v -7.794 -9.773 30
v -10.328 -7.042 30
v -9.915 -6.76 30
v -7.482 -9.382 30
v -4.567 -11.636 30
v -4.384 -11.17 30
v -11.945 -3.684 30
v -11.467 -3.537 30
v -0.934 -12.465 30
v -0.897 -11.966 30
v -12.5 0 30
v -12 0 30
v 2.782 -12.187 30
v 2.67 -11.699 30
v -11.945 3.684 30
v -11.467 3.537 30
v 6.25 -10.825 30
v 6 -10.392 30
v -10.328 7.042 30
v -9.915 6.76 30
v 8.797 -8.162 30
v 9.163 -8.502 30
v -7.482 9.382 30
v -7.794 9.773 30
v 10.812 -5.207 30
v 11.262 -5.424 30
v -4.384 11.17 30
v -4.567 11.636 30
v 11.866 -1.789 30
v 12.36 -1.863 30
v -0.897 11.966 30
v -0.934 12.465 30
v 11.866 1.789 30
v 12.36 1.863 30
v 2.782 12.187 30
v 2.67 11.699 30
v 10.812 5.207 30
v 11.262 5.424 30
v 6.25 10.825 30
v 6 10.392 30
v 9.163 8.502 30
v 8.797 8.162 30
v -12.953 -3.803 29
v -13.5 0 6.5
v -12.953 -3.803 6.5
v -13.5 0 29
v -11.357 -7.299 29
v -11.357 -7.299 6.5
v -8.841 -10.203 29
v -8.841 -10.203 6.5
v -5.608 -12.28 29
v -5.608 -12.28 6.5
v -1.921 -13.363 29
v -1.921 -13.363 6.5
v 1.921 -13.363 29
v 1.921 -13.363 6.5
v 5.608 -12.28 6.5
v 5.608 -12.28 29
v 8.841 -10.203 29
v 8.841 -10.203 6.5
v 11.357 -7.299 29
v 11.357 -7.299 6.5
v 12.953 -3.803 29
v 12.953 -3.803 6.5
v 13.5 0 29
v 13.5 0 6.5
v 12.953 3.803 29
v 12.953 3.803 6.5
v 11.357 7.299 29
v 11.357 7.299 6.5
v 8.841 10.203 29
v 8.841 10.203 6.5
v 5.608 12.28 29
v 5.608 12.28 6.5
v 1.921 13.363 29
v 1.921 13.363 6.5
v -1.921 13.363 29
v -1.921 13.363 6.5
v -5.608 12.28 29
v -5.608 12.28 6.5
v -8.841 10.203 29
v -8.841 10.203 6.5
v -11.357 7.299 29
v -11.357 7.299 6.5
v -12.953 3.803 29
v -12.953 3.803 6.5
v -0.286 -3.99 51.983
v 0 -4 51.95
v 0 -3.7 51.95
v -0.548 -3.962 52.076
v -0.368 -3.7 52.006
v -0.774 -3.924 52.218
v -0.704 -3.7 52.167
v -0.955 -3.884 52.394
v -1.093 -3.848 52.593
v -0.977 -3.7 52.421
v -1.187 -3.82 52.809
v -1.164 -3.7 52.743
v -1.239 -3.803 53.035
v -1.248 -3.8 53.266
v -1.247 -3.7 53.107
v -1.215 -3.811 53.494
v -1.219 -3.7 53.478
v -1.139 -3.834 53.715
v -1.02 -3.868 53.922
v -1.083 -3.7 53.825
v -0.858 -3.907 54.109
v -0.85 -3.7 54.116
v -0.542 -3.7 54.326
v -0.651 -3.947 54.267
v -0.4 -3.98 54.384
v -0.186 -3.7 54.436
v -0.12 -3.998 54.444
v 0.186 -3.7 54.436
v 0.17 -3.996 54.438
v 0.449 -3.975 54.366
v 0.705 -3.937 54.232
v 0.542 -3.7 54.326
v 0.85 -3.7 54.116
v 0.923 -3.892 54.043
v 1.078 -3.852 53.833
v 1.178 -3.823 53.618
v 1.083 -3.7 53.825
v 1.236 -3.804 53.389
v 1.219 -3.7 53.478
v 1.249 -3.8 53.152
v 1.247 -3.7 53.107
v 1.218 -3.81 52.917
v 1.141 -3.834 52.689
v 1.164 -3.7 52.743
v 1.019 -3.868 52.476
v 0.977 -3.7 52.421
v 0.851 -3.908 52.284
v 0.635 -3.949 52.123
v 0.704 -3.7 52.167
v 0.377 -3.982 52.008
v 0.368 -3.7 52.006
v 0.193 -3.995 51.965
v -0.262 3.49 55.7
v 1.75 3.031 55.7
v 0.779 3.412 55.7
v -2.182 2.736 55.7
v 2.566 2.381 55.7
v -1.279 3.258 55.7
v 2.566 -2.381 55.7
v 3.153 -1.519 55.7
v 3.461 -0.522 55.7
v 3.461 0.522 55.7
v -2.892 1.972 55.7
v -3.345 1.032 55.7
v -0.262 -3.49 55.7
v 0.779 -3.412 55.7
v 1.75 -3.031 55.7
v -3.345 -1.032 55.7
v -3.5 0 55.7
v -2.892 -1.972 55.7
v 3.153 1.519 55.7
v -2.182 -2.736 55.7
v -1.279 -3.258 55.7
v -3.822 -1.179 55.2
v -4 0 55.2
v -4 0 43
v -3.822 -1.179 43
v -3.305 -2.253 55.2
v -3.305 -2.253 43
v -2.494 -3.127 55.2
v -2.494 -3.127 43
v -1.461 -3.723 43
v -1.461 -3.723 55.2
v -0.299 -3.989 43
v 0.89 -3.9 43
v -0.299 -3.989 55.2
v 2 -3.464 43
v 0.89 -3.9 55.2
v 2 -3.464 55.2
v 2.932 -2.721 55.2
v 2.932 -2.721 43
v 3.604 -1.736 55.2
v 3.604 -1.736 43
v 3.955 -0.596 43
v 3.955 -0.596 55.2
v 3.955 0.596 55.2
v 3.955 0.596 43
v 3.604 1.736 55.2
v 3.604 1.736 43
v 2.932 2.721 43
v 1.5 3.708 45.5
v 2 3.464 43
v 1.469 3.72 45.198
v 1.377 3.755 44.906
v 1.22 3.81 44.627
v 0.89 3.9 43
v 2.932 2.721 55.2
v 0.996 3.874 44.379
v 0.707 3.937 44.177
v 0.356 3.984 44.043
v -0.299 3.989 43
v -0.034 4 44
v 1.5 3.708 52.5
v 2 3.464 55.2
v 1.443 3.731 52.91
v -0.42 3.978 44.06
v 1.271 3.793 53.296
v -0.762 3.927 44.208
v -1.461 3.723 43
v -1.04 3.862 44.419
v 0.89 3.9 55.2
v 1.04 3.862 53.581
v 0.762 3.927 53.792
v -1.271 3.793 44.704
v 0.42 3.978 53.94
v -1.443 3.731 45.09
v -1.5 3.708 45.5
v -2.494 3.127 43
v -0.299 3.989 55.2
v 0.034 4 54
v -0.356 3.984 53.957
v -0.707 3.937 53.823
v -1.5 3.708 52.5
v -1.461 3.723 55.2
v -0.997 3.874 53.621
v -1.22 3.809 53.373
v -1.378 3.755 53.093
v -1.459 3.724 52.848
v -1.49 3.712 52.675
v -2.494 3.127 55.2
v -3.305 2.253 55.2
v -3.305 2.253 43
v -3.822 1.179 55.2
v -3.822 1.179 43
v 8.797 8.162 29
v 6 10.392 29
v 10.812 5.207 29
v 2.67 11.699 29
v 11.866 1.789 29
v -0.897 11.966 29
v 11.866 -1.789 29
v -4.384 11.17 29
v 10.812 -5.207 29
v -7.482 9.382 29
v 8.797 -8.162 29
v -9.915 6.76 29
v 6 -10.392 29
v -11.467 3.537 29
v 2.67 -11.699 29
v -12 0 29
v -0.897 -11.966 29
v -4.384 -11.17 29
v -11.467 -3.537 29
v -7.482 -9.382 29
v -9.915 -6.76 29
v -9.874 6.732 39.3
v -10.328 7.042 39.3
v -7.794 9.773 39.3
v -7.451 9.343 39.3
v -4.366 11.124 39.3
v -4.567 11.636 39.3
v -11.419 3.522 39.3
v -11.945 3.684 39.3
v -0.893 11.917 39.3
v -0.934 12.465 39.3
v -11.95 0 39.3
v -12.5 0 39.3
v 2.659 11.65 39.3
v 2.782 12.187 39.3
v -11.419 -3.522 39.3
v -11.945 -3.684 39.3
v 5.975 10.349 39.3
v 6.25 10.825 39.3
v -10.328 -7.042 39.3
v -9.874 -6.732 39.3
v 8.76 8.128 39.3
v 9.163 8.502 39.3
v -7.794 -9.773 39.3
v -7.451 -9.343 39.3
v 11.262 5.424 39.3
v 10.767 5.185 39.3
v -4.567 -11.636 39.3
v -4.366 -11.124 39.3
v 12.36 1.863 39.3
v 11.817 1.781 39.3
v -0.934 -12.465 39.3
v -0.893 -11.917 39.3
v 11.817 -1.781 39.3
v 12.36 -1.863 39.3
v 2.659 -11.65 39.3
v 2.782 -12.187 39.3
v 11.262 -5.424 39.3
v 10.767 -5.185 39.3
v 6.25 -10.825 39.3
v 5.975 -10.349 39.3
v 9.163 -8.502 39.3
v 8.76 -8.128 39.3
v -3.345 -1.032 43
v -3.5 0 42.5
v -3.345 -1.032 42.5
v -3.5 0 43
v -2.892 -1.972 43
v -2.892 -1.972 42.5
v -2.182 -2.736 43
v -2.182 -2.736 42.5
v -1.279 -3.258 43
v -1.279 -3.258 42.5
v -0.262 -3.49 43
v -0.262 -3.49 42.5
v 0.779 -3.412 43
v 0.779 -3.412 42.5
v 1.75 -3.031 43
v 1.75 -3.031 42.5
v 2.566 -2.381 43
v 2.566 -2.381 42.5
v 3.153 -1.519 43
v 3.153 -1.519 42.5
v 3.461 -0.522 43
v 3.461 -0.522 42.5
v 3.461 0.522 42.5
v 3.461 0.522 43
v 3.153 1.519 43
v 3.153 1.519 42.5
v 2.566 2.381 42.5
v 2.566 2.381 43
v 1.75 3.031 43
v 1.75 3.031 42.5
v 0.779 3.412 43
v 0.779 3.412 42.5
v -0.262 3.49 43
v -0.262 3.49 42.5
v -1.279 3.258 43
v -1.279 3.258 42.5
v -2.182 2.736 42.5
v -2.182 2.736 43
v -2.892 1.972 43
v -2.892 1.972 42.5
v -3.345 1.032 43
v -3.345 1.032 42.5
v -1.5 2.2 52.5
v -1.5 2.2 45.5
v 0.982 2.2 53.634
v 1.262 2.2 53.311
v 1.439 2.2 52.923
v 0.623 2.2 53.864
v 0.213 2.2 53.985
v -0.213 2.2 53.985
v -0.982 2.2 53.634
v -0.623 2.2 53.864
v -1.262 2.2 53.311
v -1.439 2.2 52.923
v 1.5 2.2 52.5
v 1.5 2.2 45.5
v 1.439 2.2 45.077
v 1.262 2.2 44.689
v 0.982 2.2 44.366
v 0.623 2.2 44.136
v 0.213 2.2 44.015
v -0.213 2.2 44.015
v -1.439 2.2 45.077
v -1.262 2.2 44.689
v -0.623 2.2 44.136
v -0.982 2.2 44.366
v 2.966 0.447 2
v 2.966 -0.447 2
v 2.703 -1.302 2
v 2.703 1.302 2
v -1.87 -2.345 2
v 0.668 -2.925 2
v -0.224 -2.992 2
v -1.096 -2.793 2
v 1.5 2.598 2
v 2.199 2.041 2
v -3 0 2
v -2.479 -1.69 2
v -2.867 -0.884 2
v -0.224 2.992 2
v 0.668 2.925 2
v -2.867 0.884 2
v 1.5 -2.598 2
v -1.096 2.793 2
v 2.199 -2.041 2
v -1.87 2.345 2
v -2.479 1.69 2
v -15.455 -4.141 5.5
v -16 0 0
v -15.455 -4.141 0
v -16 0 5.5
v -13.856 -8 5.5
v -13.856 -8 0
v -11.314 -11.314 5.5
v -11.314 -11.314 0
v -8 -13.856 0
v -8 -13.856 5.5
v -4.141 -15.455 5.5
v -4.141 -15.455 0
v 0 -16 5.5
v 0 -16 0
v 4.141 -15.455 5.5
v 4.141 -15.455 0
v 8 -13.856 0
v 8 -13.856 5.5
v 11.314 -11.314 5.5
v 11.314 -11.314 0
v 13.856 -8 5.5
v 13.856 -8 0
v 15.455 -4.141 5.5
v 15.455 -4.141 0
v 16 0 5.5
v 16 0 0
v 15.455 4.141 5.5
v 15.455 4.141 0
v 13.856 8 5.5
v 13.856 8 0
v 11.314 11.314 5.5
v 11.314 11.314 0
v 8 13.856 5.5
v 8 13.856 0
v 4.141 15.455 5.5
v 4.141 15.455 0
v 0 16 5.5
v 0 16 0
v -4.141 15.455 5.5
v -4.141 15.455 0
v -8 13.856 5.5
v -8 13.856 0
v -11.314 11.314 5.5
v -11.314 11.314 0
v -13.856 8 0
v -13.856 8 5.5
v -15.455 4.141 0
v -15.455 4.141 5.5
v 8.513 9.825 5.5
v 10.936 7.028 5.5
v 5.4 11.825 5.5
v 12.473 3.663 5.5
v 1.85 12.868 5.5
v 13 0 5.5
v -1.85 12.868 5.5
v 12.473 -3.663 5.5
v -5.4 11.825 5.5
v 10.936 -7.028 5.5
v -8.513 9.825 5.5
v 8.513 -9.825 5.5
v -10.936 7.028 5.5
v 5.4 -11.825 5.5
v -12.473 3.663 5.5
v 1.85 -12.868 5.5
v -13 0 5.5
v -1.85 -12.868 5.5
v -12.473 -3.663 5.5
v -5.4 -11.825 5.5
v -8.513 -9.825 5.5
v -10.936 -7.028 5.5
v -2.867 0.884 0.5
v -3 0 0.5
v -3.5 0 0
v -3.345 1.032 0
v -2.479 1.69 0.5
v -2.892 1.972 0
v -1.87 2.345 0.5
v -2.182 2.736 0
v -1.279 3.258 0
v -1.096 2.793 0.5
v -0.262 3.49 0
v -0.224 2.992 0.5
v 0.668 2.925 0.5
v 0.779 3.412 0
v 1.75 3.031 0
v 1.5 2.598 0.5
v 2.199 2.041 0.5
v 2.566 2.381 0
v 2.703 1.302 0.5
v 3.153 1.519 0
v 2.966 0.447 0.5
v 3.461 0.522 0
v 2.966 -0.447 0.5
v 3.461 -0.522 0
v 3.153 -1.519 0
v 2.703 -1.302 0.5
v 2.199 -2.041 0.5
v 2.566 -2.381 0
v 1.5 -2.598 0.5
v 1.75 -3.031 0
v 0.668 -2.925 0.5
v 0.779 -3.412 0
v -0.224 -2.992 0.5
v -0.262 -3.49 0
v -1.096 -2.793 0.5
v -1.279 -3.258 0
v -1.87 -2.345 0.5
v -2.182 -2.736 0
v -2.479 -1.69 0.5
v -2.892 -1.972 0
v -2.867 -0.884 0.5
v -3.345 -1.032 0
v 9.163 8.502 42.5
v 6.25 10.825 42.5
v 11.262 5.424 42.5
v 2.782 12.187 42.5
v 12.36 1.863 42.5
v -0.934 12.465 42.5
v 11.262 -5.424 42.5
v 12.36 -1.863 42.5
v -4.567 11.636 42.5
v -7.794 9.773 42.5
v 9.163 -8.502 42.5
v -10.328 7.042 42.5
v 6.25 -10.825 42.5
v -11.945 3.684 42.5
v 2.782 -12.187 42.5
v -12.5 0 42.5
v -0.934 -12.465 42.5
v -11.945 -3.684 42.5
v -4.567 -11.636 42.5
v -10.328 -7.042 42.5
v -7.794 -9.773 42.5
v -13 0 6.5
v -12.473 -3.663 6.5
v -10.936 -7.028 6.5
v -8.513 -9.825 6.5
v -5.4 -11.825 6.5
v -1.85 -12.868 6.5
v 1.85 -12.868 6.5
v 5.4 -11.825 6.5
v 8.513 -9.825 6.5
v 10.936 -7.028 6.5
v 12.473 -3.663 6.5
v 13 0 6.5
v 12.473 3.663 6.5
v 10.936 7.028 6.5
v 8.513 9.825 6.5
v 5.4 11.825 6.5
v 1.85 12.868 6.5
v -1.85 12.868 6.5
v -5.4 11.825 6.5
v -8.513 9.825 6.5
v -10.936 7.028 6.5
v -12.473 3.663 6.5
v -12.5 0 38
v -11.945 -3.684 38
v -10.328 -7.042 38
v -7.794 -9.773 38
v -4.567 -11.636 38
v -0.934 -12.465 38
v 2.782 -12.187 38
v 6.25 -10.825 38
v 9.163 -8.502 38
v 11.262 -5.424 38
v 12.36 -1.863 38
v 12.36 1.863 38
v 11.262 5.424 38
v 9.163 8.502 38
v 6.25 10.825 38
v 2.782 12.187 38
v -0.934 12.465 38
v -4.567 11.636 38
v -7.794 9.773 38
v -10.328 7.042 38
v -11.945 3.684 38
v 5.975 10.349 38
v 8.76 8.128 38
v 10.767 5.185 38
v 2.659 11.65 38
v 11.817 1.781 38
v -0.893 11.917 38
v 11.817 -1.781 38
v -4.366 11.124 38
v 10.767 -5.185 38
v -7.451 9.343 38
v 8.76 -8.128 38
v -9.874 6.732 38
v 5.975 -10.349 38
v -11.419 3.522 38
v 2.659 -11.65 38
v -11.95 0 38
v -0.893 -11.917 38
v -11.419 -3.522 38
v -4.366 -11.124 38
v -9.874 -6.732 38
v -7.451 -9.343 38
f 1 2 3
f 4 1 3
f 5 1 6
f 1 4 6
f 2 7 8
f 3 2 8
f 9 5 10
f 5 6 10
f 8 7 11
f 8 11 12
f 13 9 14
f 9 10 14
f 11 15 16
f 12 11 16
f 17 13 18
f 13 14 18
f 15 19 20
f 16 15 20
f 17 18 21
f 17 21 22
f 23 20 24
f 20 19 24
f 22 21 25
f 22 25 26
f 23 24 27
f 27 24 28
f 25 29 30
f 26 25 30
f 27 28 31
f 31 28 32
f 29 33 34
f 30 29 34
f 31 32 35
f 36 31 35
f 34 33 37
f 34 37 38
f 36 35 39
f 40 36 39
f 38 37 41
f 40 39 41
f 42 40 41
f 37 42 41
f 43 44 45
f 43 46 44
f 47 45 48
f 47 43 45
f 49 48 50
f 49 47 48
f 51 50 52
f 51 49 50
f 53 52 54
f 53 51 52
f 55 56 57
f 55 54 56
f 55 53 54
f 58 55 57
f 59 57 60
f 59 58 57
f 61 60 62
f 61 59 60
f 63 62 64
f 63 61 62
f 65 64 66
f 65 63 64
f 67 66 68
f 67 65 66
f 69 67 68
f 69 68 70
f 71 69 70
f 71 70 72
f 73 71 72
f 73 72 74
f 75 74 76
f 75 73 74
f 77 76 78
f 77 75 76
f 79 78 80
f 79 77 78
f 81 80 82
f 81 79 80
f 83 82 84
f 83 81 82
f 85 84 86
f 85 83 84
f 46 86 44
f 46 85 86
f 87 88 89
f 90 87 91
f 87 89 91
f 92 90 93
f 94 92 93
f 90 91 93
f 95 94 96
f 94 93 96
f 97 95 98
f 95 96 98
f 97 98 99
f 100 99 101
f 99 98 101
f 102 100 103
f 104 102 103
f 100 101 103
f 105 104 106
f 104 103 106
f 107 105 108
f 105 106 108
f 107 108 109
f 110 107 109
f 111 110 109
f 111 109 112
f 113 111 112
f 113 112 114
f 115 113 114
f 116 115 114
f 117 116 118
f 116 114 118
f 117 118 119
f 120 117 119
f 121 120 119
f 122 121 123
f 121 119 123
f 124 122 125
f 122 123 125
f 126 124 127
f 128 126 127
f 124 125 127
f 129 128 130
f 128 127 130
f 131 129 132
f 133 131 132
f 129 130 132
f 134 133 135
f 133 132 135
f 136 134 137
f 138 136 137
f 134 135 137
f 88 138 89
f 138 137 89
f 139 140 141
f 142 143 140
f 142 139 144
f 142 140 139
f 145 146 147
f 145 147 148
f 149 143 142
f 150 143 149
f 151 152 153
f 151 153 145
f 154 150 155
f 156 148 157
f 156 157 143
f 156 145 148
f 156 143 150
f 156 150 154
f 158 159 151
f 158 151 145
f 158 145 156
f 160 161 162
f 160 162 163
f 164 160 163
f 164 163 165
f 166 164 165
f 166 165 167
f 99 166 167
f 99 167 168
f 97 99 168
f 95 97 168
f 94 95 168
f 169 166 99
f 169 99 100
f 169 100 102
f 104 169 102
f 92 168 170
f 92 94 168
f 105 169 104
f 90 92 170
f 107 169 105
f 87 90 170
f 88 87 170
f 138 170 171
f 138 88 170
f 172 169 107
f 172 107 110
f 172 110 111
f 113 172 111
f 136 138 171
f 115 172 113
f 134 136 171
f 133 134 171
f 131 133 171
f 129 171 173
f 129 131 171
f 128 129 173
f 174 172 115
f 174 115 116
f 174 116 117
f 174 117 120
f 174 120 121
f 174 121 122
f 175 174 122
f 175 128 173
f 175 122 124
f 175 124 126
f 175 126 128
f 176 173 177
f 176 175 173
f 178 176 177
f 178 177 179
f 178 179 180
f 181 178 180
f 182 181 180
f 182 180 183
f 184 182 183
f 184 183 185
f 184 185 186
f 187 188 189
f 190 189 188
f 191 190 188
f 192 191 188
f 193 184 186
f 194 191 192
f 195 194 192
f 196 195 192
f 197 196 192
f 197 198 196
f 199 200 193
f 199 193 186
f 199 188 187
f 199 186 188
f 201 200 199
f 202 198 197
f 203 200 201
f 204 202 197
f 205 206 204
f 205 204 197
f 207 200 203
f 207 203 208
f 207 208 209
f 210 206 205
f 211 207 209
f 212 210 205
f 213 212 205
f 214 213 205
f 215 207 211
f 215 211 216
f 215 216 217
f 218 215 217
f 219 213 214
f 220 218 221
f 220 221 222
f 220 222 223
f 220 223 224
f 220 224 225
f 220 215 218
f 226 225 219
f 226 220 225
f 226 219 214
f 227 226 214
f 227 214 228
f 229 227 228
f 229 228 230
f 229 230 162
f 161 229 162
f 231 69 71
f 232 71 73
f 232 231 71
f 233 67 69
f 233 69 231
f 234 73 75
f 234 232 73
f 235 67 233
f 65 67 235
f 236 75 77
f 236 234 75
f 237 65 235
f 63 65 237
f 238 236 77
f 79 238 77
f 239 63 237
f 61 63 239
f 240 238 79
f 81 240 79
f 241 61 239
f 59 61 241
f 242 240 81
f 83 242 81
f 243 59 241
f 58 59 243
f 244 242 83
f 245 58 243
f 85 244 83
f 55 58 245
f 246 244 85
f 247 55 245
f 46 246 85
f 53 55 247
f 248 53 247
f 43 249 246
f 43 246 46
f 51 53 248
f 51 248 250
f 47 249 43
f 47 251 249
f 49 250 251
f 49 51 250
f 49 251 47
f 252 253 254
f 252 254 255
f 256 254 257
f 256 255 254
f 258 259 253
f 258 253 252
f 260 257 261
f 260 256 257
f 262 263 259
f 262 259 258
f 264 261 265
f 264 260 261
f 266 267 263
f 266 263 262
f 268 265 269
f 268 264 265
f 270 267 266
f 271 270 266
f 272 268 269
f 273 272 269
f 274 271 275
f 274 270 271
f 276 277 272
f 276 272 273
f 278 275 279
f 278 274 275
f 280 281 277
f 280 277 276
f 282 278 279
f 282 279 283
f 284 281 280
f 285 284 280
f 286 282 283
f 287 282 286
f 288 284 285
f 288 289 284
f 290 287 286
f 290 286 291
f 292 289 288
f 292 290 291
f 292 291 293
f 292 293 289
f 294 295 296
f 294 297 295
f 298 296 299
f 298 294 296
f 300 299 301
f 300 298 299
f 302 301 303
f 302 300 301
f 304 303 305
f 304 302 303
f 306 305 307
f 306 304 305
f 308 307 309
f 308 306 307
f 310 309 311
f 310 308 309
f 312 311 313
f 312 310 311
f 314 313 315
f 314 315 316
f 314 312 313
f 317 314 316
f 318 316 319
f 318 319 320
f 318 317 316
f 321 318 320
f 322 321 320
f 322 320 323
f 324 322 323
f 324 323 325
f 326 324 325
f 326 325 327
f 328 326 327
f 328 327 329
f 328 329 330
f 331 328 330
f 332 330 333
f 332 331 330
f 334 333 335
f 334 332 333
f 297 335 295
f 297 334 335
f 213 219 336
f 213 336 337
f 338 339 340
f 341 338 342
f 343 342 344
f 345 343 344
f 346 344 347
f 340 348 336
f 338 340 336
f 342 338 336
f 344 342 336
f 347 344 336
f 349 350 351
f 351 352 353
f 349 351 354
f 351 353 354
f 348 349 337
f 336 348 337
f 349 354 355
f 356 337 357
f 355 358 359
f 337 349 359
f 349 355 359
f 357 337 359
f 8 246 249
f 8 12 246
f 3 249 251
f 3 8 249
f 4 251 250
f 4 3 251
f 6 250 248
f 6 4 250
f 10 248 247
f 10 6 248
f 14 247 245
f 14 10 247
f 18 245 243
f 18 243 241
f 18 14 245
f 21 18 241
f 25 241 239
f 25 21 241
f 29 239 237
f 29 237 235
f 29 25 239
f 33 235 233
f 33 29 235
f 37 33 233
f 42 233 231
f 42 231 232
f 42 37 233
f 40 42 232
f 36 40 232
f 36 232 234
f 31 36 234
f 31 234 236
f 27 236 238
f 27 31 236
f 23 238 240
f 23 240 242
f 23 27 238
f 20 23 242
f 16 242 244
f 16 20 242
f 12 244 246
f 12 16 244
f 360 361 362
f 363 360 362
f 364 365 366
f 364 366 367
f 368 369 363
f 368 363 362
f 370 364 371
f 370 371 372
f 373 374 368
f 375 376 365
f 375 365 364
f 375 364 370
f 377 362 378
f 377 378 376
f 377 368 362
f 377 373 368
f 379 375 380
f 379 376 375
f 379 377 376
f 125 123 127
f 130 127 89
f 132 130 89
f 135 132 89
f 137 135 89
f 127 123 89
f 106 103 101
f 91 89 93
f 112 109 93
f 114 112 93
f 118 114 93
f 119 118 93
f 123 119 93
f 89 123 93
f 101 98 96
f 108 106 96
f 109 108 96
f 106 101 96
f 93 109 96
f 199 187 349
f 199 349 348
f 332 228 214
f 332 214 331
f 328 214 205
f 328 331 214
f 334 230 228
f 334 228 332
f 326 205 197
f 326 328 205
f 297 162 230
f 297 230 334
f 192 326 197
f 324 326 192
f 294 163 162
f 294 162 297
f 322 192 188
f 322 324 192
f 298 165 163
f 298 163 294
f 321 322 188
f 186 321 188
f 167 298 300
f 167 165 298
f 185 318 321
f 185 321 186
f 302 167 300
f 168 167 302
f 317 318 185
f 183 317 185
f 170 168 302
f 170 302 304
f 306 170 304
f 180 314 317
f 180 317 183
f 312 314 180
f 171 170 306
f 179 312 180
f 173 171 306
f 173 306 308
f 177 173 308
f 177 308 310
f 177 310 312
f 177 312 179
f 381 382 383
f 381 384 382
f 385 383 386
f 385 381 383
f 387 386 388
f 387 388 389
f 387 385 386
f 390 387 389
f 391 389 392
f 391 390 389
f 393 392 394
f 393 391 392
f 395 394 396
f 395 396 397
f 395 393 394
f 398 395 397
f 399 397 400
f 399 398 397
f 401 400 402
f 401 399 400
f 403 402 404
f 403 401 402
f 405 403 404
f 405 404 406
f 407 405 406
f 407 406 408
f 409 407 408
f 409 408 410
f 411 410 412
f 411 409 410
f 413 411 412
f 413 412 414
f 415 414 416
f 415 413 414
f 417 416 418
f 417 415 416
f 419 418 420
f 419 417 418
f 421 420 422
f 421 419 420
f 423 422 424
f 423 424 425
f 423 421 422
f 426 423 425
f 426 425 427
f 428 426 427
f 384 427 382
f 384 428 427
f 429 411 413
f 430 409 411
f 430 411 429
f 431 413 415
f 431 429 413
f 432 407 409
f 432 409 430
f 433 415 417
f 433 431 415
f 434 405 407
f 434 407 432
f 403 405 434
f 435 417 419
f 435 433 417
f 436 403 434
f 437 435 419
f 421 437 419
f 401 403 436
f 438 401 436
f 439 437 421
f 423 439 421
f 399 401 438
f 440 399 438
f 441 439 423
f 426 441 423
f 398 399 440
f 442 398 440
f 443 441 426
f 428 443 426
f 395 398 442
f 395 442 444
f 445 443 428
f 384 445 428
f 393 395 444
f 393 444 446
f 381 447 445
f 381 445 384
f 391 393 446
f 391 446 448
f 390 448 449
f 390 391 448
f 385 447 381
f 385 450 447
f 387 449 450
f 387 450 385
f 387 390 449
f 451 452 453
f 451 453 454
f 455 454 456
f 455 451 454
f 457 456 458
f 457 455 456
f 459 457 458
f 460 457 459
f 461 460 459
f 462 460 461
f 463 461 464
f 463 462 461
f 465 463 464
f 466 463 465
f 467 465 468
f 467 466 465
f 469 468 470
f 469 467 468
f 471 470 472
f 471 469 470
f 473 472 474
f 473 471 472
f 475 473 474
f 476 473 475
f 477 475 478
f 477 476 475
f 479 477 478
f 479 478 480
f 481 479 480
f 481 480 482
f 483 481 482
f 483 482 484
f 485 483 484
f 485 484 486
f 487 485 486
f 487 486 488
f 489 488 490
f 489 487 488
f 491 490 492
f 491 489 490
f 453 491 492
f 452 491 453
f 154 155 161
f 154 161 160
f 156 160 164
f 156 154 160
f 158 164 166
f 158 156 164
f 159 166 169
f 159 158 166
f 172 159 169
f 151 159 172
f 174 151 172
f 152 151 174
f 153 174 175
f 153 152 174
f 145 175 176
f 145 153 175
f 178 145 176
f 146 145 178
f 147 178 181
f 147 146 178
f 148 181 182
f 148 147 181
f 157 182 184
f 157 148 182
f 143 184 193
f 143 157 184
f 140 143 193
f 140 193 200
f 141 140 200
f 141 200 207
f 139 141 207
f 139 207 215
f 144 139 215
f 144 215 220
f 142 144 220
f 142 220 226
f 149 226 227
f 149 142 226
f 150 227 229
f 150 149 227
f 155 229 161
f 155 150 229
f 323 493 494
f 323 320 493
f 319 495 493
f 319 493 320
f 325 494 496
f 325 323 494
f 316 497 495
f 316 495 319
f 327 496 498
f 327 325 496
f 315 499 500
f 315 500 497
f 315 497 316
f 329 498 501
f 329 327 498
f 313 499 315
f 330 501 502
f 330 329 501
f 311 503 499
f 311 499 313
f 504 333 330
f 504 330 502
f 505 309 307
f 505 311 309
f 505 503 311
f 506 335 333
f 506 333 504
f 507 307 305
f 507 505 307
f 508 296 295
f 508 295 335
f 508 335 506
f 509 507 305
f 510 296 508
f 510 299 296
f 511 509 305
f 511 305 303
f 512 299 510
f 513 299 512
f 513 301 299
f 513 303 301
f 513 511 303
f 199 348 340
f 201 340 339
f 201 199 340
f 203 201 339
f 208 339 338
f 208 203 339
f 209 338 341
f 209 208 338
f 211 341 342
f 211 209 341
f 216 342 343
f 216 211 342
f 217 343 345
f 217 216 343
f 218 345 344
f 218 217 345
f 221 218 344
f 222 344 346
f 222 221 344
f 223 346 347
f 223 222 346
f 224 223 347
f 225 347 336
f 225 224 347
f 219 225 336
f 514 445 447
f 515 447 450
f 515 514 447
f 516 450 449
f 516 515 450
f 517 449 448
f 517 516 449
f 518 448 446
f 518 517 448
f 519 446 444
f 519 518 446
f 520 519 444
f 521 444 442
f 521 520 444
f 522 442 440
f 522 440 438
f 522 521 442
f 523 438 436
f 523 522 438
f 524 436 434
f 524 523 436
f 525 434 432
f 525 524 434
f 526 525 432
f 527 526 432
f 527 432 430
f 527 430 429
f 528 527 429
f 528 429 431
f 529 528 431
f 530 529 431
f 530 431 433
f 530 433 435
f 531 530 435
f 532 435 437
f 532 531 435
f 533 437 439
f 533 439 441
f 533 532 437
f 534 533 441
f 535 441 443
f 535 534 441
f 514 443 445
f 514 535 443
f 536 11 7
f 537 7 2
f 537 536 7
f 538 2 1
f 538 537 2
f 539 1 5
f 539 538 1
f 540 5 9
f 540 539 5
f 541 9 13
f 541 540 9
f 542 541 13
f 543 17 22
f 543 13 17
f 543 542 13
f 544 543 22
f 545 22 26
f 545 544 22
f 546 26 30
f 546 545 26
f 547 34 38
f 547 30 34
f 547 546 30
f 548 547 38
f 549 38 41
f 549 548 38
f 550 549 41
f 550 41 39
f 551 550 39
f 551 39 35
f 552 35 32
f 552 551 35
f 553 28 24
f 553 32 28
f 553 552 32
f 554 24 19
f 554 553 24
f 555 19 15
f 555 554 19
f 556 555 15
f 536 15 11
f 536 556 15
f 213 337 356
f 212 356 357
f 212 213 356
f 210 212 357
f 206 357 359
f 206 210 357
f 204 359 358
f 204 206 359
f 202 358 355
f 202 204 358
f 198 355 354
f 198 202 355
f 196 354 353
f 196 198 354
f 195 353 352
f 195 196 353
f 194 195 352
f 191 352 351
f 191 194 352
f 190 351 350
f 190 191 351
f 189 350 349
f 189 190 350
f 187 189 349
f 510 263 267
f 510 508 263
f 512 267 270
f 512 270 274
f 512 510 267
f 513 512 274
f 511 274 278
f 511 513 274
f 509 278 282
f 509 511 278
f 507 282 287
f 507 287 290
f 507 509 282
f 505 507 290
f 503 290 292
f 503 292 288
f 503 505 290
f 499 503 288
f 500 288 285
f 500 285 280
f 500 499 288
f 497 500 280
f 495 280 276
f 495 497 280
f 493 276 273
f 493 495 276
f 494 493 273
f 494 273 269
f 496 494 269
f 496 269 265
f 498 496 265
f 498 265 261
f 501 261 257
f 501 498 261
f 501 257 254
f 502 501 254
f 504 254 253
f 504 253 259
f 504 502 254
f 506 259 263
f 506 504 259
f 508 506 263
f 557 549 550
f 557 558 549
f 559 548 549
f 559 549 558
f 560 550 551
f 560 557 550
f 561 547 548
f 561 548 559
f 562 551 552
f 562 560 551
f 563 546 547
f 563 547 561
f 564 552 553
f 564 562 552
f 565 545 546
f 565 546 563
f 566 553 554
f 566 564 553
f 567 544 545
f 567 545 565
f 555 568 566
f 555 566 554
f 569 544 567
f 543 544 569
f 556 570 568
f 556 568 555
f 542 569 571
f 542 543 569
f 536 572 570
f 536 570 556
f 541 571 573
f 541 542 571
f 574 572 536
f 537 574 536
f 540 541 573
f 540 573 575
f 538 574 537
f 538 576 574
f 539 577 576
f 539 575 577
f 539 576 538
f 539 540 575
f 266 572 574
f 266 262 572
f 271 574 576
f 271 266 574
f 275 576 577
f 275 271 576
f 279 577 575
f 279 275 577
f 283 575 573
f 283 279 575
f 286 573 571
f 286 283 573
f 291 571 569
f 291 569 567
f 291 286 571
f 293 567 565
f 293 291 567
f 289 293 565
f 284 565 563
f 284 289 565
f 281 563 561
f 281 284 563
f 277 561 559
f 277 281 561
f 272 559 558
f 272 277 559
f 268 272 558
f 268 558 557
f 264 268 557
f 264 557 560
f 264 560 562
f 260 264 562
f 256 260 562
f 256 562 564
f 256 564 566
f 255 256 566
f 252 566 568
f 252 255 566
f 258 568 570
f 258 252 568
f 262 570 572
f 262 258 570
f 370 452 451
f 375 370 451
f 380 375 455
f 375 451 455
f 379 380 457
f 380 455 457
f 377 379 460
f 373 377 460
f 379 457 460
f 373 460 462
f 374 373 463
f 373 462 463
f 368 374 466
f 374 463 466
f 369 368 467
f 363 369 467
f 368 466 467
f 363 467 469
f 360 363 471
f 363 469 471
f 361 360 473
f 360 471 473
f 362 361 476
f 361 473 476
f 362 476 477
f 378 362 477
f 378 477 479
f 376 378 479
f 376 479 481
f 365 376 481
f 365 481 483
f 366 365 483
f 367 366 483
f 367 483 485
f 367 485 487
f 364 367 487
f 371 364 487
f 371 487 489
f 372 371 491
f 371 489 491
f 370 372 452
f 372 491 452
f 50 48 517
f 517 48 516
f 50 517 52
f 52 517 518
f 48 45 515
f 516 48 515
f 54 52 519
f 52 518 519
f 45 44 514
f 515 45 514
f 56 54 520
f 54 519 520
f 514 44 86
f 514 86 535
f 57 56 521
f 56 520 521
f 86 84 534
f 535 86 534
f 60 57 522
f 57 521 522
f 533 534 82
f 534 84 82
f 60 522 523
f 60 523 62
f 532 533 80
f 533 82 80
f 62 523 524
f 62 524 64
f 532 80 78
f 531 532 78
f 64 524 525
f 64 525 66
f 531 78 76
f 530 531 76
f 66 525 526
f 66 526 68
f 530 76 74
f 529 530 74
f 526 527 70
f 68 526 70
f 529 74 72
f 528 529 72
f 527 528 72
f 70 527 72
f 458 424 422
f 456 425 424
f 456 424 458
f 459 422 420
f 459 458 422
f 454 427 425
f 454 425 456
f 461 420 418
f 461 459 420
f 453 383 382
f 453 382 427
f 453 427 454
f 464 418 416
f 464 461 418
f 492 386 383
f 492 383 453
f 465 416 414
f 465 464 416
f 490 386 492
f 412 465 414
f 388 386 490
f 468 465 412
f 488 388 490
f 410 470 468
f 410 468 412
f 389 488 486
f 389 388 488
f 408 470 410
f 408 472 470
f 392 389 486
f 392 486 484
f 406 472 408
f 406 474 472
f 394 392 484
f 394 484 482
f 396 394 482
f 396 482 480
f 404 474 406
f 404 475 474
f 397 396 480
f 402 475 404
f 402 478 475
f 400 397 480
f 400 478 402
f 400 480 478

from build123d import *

# Parameters (mm, degrees)
CHAMFER_1_SIZE      = 0.5
CUT_EXTRUDE_1_DEPTH = 1.8
SKETCH_3_R          = 3
CUT_EXTRUDE_2_DEPTH = 2
SKETCH_4_W          = 1.25
SKETCH_4_H          = 0.3
CHAMFER_2_SIZE      = 0.5
SKETCH_5_W          = 0.5
SKETCH_5_H          = 0.5


with BuildPart() as part:
    # 草图1 → 旋转1 (revolve)
    with BuildSketch(Plane(origin=(0, 0, 0), x_dir=(0, 0, -1), z_dir=(1, 0, 0))):
        Polygon((0, 0), (0, 16), (-5.5, 16), (-5.5, 13), (-6, 13), (-6, 13.5), (-29, 13.5), (-29, 12), (-29.5, 12), (-29.5, 12.5), (-38, 12.5), (-38, 11.95), (-39.3, 11.95), (-39.3, 12.5), (-42.5, 12.5), (-42.5, 3.5), (-43, 3.5), (-43, 4), (-55.7, 4), (-55.7, 0), align=None)
    revolve(axis=Axis((0, 0, 0), (0, 0, 1)))

    # 倒角1
    chamfer_1_edges = [part.edges().sort_by_distance(p)[0] for p in [
        (0, -4, 55.7),
    ]]
    chamfer(chamfer_1_edges, length=CHAMFER_1_SIZE)

    # 草图2 → 切除-拉伸1 (cut)
    with BuildSketch(Plane(origin=(0, 4, 0), x_dir=(1, 0, 0), z_dir=(0, 1, 0))):
        with BuildLine():
            Line((-1.5, -52.5), (-1.5, -45.5))
            ThreePointArc((-1.5, -45.5), (0, -44), (1.5, -45.5))
            Line((1.5, -45.5), (1.5, -52.5))
            ThreePointArc((1.5, -52.5), (0, -54), (-1.5, -52.5))
        make_face()
    extrude(amount=-CUT_EXTRUDE_1_DEPTH, mode=Mode.SUBTRACT)

    # 草图3 → 切除-拉伸2 (cut)
    with BuildSketch(Plane(origin=(0, 0, 0), x_dir=(-1, 0, 0), z_dir=(0, 0, -1))):
        Circle(SKETCH_3_R)
    extrude(amount=-CUT_EXTRUDE_2_DEPTH, mode=Mode.SUBTRACT)

    # 草图4 → 切除-旋转1 (revolve, cut)
    with BuildSketch(Plane(origin=(0, 0, 0), x_dir=(0, 0, -1), z_dir=(1, 0, 0))):
        with Locations((-53.825, -3.85)):
            Rectangle(SKETCH_4_W, SKETCH_4_H)
    revolve(axis=Axis((0, -4, 53.2), (0, 1, 0)), mode=Mode.SUBTRACT)

    # 倒角2
    chamfer_2_edges = [part.edges().sort_by_distance(p)[0] for p in [
        (3, 0, 0),
    ]]
    chamfer(chamfer_2_edges, length=CHAMFER_2_SIZE)

    # 草图5 → 切除-旋转2 (revolve, cut)
    with BuildSketch(Plane(origin=(0, 0, 0), x_dir=(0, 0, -1), z_dir=(1, 0, 0))):
        with Locations((-29.75, 12.25)):
            Rectangle(SKETCH_5_W, SKETCH_5_H)
        with Locations((-6.25, 13.25)):
            Rectangle(SKETCH_5_W, SKETCH_5_H)
    revolve(axis=Axis((0, 0, 55.7), (0, 0, -1)), mode=Mode.SUBTRACT)


solid = part.part
